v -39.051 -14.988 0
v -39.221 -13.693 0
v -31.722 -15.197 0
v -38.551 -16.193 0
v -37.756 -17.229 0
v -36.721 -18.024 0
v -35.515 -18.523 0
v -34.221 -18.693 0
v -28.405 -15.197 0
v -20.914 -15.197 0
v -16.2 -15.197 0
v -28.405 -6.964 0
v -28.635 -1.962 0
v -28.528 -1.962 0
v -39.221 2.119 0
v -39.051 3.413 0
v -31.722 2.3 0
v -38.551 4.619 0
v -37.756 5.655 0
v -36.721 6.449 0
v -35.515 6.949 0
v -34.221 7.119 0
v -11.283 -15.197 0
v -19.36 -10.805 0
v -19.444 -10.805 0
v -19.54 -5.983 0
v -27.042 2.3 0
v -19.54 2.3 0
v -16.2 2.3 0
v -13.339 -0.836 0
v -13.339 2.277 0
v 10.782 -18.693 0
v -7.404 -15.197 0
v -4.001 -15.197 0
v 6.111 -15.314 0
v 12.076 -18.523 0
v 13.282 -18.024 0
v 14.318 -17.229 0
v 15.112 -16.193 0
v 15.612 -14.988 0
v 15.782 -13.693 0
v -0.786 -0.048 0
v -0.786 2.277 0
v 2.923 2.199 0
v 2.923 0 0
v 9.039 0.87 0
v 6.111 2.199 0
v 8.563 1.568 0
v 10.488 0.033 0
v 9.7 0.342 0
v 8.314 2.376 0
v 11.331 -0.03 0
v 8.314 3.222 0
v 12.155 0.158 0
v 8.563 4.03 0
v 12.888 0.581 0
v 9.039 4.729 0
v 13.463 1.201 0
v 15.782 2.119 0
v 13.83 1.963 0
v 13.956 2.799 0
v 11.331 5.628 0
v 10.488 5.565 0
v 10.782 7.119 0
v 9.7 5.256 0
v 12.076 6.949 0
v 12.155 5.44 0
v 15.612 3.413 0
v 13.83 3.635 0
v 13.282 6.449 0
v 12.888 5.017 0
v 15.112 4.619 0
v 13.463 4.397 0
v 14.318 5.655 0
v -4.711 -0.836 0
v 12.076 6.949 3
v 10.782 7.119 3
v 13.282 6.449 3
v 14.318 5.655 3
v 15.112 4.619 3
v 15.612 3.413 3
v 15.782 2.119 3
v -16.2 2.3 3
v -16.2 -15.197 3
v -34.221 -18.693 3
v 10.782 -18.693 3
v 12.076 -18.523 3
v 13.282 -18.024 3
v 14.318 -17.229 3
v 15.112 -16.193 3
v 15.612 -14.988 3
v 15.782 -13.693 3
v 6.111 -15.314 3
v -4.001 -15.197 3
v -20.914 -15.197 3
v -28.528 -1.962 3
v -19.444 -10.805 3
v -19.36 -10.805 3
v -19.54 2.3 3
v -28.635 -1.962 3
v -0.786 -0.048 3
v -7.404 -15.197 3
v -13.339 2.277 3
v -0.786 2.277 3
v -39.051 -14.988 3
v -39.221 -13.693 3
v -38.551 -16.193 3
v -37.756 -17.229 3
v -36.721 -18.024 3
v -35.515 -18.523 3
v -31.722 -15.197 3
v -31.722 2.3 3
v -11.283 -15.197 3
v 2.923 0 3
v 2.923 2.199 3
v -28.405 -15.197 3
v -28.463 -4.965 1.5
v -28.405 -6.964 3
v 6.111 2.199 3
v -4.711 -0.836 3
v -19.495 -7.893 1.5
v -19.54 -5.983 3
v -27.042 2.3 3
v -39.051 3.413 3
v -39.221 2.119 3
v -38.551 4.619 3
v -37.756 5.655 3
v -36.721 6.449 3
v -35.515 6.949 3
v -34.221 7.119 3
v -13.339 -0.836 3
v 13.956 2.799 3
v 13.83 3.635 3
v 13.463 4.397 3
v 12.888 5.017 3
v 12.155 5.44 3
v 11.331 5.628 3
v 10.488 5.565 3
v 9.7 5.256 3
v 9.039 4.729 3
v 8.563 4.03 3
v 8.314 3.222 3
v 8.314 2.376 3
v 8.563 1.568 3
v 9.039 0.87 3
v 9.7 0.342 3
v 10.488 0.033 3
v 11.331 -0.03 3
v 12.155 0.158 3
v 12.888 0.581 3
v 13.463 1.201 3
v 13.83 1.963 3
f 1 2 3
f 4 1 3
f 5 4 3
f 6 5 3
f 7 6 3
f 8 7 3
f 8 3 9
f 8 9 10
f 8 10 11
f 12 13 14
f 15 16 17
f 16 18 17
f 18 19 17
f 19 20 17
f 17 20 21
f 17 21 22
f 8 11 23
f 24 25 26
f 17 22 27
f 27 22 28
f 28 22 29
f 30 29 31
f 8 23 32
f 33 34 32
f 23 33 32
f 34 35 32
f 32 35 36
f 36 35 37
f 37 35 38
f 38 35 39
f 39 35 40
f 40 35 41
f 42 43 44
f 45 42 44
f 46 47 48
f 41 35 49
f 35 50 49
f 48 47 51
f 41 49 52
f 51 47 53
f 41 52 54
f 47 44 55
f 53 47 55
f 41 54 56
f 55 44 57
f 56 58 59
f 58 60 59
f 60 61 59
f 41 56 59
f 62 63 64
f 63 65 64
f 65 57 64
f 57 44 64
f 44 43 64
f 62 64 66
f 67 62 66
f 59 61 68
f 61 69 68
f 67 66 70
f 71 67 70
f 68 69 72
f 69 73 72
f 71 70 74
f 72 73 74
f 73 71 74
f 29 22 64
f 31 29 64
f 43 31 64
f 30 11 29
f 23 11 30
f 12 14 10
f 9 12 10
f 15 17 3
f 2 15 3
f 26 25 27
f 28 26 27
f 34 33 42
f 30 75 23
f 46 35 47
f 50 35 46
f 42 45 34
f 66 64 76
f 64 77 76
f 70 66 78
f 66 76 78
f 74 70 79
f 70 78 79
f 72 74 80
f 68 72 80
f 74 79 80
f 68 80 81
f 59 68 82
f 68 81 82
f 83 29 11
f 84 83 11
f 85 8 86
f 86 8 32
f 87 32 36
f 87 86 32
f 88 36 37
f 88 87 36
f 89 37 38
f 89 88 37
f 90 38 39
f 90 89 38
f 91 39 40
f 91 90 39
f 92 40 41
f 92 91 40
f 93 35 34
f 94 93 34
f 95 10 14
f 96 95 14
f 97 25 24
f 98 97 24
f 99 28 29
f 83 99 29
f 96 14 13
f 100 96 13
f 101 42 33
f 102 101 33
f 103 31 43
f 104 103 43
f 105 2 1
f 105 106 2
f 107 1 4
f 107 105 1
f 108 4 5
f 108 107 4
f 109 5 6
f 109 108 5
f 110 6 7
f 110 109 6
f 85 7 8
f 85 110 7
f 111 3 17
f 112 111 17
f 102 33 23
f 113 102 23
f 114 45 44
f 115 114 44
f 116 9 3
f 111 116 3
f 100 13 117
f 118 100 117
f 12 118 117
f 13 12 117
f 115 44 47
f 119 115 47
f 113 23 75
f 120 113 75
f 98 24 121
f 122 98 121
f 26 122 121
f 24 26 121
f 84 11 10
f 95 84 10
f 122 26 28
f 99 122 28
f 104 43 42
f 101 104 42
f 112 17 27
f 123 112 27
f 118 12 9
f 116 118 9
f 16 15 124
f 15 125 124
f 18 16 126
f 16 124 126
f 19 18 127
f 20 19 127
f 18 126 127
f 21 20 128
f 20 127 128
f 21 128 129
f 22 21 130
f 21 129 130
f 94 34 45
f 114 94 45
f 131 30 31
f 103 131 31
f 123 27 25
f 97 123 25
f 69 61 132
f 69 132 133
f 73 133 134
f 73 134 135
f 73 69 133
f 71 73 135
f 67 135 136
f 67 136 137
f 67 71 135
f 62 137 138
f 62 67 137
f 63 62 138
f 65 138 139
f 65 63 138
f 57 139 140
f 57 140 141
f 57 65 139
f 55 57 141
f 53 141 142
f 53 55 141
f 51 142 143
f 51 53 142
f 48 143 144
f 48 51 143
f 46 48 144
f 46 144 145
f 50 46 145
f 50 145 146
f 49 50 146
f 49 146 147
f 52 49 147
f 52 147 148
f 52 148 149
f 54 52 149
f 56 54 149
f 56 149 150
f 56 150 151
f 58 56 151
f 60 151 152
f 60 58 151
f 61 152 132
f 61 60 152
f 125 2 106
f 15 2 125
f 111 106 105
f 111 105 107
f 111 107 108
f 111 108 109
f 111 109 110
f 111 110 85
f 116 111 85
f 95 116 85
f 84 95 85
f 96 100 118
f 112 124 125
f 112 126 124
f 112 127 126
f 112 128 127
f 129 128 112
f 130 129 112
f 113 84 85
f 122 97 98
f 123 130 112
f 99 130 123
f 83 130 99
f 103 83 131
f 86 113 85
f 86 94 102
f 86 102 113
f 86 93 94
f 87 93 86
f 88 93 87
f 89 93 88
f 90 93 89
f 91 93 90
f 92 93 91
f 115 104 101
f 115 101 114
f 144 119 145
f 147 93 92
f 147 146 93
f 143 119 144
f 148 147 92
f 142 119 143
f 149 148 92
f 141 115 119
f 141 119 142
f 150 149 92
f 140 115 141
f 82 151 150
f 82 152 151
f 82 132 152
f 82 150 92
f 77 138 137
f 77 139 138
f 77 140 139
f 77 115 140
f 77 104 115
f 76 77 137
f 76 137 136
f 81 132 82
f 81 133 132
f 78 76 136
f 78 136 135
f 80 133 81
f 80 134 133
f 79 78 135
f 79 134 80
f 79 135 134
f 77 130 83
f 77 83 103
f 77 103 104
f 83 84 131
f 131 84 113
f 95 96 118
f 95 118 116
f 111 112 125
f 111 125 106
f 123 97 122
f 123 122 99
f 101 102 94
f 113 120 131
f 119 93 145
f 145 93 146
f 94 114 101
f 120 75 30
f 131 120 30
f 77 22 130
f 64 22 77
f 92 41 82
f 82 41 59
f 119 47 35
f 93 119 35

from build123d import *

# Parameters (mm, degrees)
F0_W     = 55.0028979778
F0_H     = 25.8127627894
F0_R     = 2.8370403088
F1_DEPTH = 3
F2_R     = 5


with BuildPart() as f1:
    # F0 (on Top) → F1 (new body)
    with BuildSketch(Plane.XY):
        with Locations((-11.7194391787, -5.7870582677)):
            Rectangle(F0_W, F0_H)
        with BuildLine():
            Line((-16.200212838, 2.2999899667), (-16.200212838, -15.1974810287))
            Line((-16.200212838, -15.1974810287), (-20.9144581423, -15.1974810287))
            Line((-20.9144581423, -15.1974810287), (-28.5277153843, -1.9623617991))
            Line((-28.5277153843, -1.9623617991), (-28.6349443596, -1.9623617991))
            add(Edge.make_bspline(
                [(-28.6349443596, -1.9623617991), (-28.405167984, -5.4664515257), (-28.405167984, -6.9638275728)],
                knots=[0, 0, 0, 1, 1, 1], degree=2))
            Line((-28.405167984, -6.9638275728), (-28.405167984, -15.1974810287))
            Line((-28.405167984, -15.1974810287), (-31.721607004, -15.1974810287))
            Line((-31.721607004, -15.1974810287), (-31.721607004, 2.2999899667))
            Line((-31.721607004, 2.2999899667), (-27.041828156, 2.2999899667))
            Line((-27.041828156, 2.2999899667), (-19.443889339, -10.8049226501))
            Line((-19.443889339, -10.8049226501), (-19.3596380013, -10.8049226501))
            add(Edge.make_bspline(
                [(-19.3596380013, -10.8049226501), (-19.5396294954, -7.3927434738), (-19.5396294954, -5.9834483706)],
                knots=[0, 0, 0, 1, 1, 1], degree=2))
            Line((-19.5396294954, -5.9834483706), (-19.5396294954, 2.2999899667))
            Line((-19.5396294954, 2.2999899667), (-16.200212838, 2.2999899667))
        make_face(mode=Mode.SUBTRACT)
        Polygon((-7.403607262, -15.1974810287), (-11.2829984019, -15.1974810287), (-4.7113940622, -0.8364575591), (-13.3394969628, -0.8364575591), (-13.3394969628, 2.2770123292), (-0.7860476472, 2.2770123292), (-0.7860476472, -0.0475586698), align=None, mode=Mode.SUBTRACT)
        Polygon((6.1111208051, -15.3139589772), (-4.0005319752, -15.1974810287), (2.923307009, 0), (2.923307009, 2.1986574866), (6.1111208051, 2.1986574866), align=None, mode=Mode.SUBTRACT)
        with Locations((11.1188692972, 2.7992387768)):
            Circle(F0_R, mode=Mode.SUBTRACT)
    extrude(amount=F1_DEPTH)

    # F2
    f2_edges = [f1.edges().sort_by_distance(p)[0] for p in [
        (-39.220888, 7.119323, 1.5),
        (-39.220888, -18.69344, 1.5),
        (15.78201, 7.119323, 1.5),
        (15.78201, -18.69344, 1.5),
    ]]
    fillet(f2_edges, radius=F2_R)


solid = f1.part
